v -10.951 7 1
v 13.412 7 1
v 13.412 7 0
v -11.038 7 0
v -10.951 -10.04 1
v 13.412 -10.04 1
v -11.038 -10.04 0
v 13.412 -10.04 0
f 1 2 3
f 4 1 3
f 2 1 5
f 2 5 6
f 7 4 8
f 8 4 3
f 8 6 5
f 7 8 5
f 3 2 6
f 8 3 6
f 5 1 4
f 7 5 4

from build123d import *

# Parameters (mm, degrees)
SKETCH_4_W               = 25.95
SKETCH_4_H               = 21.04
EXTRUDE_1_DEPTH          = 1
CUT_EXTRUDE_1_DEPTH      = 22.04
CUT_EXTRUDE_2_DEPTH      = 22.04
CUT_EXTRUDE_4_DEPTH      = 15.911872331
CUT_EXTRUDE_4_DEPTH_BACK = 12.038127669
CUT_EXTRUDE_5_DEPTH      = 15.911872331
CUT_EXTRUDE_5_DEPTH_BACK = 12.038127669
CUT_EXTRUDE_6_DEPTH      = 1
SKETCH_14_W              = 1
SKETCH_14_H              = 2
CUT_EXTRUDE_7_DEPTH      = 10


with BuildPart() as part:
    # 草图4 → 凸台-拉伸1 (new body)
    with BuildSketch(Plane.XY):
        with Locations((1.936872331, -1.52)):
            Rectangle(SKETCH_4_W, SKETCH_4_H)
    extrude(amount=EXTRUDE_1_DEPTH)

    # 草图6 → 切除-拉伸1 (cut, through all)
    with BuildSketch(Plane(origin=(0, 9, 0), x_dir=(1, 0, 0), z_dir=(0, 1, 0))):
        Polygon((-11.038127669, 0), (-11.038127669, -1), (-10.950639006, -1), align=None)
    extrude(amount=-CUT_EXTRUDE_1_DEPTH, mode=Mode.SUBTRACT)

    # 草图7 → 切除-拉伸2 (cut, through all)
    with BuildSketch(Plane(origin=(0, 9, 0), x_dir=(1, 0, 0), z_dir=(0, 1, 0))):
        Polygon((14.911872331, -1), (14.894417266, 0), (14.911872331, 0), align=None)
    extrude(amount=-CUT_EXTRUDE_2_DEPTH, mode=Mode.SUBTRACT)

    # 草图11 → 切除-拉伸4 (cut, two sides)
    with BuildSketch(Plane(origin=(0, 0, 0), x_dir=(0, 0, -1), z_dir=(1, 0, 0))) as cut_extrude_4_sk:
        Polygon((-1, -12.04), (0, -12.04), (0, -12.022544935), align=None)
    extrude(amount=CUT_EXTRUDE_4_DEPTH, mode=Mode.SUBTRACT)
    extrude(cut_extrude_4_sk.sketch, amount=-CUT_EXTRUDE_4_DEPTH_BACK, mode=Mode.SUBTRACT)

    # 草图12 → 切除-拉伸5 (cut, two sides)
    with BuildSketch(Plane(origin=(0, 0, 0), x_dir=(0, 0, -1), z_dir=(1, 0, 0))) as cut_extrude_5_sk:
        Polygon((-1, 9), (0, 9), (0, 8.982544935), align=None)
    extrude(amount=CUT_EXTRUDE_5_DEPTH, mode=Mode.SUBTRACT)
    extrude(cut_extrude_5_sk.sketch, amount=-CUT_EXTRUDE_5_DEPTH_BACK, mode=Mode.SUBTRACT)

    # 草图13 → 切除-拉伸6 (cut)
    with BuildSketch(Plane.XY.offset(1)):
        Polygon((-10.950639006, 7), (13.411872331, 7), (13.411872331, -10.04), (-10.950639006, -10.04), (-10.950639006, -12.04), (14.911872331, -12.04), (14.911872331, 9), (-10.950639006, 9), align=None)
    extrude(amount=-CUT_EXTRUDE_6_DEPTH, mode=Mode.SUBTRACT)

    # 草图14 → 切除-拉伸7 (cut)
    with BuildSketch(Plane(origin=(-10.950639006, 0, 0), x_dir=(0, 0, -1), z_dir=(1, 0, 0))):
        with Locations((-0.5, 8)):
            Rectangle(SKETCH_14_W, SKETCH_14_H)
        with Locations((-0.5, -11.04)):
            Rectangle(SKETCH_14_W, SKETCH_14_H)
    extrude(amount=-CUT_EXTRUDE_7_DEPTH, mode=Mode.SUBTRACT)


solid = part.part
